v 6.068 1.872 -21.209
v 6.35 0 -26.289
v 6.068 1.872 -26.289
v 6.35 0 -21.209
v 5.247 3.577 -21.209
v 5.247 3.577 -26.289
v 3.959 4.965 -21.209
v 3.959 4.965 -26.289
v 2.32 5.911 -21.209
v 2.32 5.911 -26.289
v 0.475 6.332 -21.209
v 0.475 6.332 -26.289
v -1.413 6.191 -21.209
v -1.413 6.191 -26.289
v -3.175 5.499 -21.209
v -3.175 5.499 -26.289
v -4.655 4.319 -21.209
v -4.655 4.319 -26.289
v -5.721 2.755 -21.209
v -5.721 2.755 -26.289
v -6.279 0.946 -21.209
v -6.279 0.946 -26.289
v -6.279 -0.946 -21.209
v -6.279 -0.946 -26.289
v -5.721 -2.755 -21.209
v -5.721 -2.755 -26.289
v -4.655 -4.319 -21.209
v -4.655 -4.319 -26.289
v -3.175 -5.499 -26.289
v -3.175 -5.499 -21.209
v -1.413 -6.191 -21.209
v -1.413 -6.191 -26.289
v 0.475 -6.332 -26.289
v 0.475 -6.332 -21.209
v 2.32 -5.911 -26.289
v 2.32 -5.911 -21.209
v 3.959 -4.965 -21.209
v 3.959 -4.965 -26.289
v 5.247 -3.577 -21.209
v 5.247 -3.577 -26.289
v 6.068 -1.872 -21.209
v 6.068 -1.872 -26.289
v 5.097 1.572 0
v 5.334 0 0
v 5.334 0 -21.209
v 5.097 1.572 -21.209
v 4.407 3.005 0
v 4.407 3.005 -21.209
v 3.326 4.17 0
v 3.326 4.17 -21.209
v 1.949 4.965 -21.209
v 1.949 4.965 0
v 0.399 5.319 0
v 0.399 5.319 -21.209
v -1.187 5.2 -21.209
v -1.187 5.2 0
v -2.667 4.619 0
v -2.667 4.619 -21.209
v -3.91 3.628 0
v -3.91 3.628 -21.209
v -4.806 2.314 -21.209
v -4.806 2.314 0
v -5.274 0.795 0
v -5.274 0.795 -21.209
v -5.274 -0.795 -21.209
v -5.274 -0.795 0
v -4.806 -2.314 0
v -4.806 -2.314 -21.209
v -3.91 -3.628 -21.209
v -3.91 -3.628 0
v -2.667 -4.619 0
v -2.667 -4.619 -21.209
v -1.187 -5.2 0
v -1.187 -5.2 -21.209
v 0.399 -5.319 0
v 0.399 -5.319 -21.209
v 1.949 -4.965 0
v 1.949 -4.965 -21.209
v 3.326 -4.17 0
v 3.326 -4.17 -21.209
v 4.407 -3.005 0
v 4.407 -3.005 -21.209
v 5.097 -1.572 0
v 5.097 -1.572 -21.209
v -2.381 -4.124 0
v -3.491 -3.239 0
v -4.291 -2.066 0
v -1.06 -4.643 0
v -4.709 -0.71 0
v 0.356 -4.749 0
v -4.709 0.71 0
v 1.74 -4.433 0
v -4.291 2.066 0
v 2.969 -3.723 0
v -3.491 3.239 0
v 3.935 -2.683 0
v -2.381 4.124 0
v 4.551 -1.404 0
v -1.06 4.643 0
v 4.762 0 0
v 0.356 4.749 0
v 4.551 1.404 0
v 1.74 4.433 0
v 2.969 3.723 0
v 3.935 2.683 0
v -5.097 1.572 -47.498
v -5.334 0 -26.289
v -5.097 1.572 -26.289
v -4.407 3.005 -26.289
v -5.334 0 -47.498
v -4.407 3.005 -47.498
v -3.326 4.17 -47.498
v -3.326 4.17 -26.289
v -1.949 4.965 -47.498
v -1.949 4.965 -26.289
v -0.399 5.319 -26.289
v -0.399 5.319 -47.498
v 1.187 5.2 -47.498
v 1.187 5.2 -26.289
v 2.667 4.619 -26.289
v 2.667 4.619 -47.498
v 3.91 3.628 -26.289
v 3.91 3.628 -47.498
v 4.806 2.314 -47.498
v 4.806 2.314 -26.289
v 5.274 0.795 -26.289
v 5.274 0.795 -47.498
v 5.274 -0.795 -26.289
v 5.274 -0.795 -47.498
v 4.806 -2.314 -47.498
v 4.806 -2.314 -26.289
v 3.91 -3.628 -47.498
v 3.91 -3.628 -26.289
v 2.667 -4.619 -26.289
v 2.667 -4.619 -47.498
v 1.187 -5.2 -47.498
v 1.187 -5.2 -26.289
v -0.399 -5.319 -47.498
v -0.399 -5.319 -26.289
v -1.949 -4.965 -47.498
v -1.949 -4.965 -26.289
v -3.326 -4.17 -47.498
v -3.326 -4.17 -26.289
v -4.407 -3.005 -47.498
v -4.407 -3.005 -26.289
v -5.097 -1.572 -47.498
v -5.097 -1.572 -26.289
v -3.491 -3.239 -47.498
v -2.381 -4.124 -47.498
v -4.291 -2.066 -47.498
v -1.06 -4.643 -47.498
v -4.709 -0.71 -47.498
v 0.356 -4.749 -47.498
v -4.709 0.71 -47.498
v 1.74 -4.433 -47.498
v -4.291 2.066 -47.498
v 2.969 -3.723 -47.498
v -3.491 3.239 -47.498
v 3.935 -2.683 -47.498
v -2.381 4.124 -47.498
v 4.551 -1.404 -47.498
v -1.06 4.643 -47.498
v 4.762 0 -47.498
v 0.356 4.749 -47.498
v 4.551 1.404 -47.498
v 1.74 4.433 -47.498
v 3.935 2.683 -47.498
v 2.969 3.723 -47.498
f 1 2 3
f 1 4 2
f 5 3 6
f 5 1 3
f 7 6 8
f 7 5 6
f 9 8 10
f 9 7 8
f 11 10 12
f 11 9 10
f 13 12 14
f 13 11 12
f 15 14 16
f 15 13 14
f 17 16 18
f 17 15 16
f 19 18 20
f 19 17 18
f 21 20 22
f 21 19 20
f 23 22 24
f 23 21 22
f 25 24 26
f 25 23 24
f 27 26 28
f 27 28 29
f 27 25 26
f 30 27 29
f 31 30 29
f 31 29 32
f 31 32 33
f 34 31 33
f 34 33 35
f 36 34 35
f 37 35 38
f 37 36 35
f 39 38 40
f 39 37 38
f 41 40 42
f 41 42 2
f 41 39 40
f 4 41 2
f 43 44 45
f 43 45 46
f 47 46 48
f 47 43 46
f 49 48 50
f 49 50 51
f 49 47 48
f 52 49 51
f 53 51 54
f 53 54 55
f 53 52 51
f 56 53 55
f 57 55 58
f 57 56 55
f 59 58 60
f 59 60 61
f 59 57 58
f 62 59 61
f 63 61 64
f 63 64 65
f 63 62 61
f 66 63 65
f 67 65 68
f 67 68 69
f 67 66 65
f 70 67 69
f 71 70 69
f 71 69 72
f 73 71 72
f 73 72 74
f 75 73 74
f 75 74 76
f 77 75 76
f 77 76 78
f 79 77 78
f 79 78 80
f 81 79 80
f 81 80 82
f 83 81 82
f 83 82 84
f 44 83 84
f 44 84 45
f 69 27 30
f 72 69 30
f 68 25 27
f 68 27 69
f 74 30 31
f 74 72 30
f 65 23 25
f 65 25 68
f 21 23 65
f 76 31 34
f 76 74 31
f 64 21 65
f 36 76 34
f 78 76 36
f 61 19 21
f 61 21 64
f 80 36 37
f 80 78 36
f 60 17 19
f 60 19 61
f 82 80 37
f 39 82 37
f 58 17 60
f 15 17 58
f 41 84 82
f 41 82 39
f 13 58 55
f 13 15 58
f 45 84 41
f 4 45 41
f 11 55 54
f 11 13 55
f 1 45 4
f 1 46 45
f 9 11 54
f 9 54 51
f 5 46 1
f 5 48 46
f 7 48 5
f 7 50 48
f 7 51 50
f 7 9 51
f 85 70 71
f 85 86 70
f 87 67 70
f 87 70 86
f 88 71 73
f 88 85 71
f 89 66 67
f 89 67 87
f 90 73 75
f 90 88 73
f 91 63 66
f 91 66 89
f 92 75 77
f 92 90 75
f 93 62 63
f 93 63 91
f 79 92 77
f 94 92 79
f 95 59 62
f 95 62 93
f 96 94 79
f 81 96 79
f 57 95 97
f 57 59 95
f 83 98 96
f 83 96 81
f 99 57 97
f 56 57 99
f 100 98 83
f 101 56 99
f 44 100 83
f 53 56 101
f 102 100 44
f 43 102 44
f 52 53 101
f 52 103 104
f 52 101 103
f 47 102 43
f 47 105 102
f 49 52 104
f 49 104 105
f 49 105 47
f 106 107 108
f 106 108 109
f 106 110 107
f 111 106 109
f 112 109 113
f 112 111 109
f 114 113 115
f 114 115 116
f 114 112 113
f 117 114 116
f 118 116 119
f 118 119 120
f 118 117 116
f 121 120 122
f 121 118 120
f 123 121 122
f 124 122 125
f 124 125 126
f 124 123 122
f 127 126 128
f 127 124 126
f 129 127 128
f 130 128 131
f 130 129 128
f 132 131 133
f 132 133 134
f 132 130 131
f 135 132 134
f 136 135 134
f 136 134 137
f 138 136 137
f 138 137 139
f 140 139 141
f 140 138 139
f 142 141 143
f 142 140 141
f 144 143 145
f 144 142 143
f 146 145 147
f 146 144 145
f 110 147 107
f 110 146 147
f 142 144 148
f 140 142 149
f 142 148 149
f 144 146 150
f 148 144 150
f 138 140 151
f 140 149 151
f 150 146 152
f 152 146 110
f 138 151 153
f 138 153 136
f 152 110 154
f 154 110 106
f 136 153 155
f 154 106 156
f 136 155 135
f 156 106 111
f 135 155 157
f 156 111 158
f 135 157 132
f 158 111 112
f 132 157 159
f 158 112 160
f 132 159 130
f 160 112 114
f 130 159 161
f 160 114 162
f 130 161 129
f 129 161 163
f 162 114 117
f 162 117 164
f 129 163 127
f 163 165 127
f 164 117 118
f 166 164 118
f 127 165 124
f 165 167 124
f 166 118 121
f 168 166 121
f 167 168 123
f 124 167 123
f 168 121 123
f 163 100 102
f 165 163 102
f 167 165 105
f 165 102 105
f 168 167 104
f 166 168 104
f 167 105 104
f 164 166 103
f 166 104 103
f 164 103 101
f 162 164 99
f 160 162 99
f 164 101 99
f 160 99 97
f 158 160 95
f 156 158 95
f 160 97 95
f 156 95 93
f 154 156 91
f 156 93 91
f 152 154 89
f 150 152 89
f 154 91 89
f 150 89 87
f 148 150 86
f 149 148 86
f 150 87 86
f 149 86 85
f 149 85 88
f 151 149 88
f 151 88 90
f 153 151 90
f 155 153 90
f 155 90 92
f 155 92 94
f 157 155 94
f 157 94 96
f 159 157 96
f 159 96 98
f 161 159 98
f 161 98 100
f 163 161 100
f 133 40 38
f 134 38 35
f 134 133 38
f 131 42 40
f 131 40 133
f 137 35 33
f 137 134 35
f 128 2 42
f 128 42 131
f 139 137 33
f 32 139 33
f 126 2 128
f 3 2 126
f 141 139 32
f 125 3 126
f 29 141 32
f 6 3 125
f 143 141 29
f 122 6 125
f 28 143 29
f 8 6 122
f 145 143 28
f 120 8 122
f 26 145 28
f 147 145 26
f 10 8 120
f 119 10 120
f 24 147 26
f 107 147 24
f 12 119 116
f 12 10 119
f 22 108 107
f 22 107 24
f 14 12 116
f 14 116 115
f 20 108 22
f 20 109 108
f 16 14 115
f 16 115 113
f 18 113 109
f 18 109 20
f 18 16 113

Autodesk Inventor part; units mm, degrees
ref_plane "YZ Plane" through (0, 0, 0) normal (1, 0, 0) x (0, 1, 0)
ref_plane "XZ Plane" through (0, 0, 0) normal (0, 1, 0) x (-1, 0, 0)
ref_plane "XY Plane" through (0, 0, 0) normal (0, 0, 1) x (1, 0, 0)
sketch "Sketch1" plane through (0, 0, 0) normal (0, 0, 1) x (1, 0, 0)
  circle A0 centre (0, 0) radius 6.35
  dimension "d0" = 12.7
extrude "Extrusion1" add sketch "Sketch1" against normal blind 47.498
sketch "Sketch2" plane through (0, 0, 0) normal (0, 0, 1) x (1, 0, 0)
  circle A0 centre (0, 0) radius 6.35 projected
  circle A1 centre (0, 0) radius 5.334
  dimension "d4" = 10.668
extrude "Extrusion2" cut sketch "Sketch2" against normal blind 21.209
sketch "Sketch3" plane through (0, 0, -47.498) normal (0, 0, -1) x (-1, 0, 0)
  circle A0 centre (0, 0) radius 6.35 projected
  circle A1 centre (0, 0) radius 5.334
  dimension "d7" = 10.668
extrude "Extrusion3" cut sketch "Sketch3" against normal blind 21.209
sketch "Sketch4" plane through (0, 0, 0) normal (0, 0, 1) x (1, 0, 0)
  circle A0 centre (0, 0) radius 5.334 projected
  circle A1 centre (0, 0) radius 4.7625
  dimension "d10" = 9.525
extrude "Extrusion4" cut sketch "Sketch4" against normal through all contours A1
properties part number "Cane Adapter"
